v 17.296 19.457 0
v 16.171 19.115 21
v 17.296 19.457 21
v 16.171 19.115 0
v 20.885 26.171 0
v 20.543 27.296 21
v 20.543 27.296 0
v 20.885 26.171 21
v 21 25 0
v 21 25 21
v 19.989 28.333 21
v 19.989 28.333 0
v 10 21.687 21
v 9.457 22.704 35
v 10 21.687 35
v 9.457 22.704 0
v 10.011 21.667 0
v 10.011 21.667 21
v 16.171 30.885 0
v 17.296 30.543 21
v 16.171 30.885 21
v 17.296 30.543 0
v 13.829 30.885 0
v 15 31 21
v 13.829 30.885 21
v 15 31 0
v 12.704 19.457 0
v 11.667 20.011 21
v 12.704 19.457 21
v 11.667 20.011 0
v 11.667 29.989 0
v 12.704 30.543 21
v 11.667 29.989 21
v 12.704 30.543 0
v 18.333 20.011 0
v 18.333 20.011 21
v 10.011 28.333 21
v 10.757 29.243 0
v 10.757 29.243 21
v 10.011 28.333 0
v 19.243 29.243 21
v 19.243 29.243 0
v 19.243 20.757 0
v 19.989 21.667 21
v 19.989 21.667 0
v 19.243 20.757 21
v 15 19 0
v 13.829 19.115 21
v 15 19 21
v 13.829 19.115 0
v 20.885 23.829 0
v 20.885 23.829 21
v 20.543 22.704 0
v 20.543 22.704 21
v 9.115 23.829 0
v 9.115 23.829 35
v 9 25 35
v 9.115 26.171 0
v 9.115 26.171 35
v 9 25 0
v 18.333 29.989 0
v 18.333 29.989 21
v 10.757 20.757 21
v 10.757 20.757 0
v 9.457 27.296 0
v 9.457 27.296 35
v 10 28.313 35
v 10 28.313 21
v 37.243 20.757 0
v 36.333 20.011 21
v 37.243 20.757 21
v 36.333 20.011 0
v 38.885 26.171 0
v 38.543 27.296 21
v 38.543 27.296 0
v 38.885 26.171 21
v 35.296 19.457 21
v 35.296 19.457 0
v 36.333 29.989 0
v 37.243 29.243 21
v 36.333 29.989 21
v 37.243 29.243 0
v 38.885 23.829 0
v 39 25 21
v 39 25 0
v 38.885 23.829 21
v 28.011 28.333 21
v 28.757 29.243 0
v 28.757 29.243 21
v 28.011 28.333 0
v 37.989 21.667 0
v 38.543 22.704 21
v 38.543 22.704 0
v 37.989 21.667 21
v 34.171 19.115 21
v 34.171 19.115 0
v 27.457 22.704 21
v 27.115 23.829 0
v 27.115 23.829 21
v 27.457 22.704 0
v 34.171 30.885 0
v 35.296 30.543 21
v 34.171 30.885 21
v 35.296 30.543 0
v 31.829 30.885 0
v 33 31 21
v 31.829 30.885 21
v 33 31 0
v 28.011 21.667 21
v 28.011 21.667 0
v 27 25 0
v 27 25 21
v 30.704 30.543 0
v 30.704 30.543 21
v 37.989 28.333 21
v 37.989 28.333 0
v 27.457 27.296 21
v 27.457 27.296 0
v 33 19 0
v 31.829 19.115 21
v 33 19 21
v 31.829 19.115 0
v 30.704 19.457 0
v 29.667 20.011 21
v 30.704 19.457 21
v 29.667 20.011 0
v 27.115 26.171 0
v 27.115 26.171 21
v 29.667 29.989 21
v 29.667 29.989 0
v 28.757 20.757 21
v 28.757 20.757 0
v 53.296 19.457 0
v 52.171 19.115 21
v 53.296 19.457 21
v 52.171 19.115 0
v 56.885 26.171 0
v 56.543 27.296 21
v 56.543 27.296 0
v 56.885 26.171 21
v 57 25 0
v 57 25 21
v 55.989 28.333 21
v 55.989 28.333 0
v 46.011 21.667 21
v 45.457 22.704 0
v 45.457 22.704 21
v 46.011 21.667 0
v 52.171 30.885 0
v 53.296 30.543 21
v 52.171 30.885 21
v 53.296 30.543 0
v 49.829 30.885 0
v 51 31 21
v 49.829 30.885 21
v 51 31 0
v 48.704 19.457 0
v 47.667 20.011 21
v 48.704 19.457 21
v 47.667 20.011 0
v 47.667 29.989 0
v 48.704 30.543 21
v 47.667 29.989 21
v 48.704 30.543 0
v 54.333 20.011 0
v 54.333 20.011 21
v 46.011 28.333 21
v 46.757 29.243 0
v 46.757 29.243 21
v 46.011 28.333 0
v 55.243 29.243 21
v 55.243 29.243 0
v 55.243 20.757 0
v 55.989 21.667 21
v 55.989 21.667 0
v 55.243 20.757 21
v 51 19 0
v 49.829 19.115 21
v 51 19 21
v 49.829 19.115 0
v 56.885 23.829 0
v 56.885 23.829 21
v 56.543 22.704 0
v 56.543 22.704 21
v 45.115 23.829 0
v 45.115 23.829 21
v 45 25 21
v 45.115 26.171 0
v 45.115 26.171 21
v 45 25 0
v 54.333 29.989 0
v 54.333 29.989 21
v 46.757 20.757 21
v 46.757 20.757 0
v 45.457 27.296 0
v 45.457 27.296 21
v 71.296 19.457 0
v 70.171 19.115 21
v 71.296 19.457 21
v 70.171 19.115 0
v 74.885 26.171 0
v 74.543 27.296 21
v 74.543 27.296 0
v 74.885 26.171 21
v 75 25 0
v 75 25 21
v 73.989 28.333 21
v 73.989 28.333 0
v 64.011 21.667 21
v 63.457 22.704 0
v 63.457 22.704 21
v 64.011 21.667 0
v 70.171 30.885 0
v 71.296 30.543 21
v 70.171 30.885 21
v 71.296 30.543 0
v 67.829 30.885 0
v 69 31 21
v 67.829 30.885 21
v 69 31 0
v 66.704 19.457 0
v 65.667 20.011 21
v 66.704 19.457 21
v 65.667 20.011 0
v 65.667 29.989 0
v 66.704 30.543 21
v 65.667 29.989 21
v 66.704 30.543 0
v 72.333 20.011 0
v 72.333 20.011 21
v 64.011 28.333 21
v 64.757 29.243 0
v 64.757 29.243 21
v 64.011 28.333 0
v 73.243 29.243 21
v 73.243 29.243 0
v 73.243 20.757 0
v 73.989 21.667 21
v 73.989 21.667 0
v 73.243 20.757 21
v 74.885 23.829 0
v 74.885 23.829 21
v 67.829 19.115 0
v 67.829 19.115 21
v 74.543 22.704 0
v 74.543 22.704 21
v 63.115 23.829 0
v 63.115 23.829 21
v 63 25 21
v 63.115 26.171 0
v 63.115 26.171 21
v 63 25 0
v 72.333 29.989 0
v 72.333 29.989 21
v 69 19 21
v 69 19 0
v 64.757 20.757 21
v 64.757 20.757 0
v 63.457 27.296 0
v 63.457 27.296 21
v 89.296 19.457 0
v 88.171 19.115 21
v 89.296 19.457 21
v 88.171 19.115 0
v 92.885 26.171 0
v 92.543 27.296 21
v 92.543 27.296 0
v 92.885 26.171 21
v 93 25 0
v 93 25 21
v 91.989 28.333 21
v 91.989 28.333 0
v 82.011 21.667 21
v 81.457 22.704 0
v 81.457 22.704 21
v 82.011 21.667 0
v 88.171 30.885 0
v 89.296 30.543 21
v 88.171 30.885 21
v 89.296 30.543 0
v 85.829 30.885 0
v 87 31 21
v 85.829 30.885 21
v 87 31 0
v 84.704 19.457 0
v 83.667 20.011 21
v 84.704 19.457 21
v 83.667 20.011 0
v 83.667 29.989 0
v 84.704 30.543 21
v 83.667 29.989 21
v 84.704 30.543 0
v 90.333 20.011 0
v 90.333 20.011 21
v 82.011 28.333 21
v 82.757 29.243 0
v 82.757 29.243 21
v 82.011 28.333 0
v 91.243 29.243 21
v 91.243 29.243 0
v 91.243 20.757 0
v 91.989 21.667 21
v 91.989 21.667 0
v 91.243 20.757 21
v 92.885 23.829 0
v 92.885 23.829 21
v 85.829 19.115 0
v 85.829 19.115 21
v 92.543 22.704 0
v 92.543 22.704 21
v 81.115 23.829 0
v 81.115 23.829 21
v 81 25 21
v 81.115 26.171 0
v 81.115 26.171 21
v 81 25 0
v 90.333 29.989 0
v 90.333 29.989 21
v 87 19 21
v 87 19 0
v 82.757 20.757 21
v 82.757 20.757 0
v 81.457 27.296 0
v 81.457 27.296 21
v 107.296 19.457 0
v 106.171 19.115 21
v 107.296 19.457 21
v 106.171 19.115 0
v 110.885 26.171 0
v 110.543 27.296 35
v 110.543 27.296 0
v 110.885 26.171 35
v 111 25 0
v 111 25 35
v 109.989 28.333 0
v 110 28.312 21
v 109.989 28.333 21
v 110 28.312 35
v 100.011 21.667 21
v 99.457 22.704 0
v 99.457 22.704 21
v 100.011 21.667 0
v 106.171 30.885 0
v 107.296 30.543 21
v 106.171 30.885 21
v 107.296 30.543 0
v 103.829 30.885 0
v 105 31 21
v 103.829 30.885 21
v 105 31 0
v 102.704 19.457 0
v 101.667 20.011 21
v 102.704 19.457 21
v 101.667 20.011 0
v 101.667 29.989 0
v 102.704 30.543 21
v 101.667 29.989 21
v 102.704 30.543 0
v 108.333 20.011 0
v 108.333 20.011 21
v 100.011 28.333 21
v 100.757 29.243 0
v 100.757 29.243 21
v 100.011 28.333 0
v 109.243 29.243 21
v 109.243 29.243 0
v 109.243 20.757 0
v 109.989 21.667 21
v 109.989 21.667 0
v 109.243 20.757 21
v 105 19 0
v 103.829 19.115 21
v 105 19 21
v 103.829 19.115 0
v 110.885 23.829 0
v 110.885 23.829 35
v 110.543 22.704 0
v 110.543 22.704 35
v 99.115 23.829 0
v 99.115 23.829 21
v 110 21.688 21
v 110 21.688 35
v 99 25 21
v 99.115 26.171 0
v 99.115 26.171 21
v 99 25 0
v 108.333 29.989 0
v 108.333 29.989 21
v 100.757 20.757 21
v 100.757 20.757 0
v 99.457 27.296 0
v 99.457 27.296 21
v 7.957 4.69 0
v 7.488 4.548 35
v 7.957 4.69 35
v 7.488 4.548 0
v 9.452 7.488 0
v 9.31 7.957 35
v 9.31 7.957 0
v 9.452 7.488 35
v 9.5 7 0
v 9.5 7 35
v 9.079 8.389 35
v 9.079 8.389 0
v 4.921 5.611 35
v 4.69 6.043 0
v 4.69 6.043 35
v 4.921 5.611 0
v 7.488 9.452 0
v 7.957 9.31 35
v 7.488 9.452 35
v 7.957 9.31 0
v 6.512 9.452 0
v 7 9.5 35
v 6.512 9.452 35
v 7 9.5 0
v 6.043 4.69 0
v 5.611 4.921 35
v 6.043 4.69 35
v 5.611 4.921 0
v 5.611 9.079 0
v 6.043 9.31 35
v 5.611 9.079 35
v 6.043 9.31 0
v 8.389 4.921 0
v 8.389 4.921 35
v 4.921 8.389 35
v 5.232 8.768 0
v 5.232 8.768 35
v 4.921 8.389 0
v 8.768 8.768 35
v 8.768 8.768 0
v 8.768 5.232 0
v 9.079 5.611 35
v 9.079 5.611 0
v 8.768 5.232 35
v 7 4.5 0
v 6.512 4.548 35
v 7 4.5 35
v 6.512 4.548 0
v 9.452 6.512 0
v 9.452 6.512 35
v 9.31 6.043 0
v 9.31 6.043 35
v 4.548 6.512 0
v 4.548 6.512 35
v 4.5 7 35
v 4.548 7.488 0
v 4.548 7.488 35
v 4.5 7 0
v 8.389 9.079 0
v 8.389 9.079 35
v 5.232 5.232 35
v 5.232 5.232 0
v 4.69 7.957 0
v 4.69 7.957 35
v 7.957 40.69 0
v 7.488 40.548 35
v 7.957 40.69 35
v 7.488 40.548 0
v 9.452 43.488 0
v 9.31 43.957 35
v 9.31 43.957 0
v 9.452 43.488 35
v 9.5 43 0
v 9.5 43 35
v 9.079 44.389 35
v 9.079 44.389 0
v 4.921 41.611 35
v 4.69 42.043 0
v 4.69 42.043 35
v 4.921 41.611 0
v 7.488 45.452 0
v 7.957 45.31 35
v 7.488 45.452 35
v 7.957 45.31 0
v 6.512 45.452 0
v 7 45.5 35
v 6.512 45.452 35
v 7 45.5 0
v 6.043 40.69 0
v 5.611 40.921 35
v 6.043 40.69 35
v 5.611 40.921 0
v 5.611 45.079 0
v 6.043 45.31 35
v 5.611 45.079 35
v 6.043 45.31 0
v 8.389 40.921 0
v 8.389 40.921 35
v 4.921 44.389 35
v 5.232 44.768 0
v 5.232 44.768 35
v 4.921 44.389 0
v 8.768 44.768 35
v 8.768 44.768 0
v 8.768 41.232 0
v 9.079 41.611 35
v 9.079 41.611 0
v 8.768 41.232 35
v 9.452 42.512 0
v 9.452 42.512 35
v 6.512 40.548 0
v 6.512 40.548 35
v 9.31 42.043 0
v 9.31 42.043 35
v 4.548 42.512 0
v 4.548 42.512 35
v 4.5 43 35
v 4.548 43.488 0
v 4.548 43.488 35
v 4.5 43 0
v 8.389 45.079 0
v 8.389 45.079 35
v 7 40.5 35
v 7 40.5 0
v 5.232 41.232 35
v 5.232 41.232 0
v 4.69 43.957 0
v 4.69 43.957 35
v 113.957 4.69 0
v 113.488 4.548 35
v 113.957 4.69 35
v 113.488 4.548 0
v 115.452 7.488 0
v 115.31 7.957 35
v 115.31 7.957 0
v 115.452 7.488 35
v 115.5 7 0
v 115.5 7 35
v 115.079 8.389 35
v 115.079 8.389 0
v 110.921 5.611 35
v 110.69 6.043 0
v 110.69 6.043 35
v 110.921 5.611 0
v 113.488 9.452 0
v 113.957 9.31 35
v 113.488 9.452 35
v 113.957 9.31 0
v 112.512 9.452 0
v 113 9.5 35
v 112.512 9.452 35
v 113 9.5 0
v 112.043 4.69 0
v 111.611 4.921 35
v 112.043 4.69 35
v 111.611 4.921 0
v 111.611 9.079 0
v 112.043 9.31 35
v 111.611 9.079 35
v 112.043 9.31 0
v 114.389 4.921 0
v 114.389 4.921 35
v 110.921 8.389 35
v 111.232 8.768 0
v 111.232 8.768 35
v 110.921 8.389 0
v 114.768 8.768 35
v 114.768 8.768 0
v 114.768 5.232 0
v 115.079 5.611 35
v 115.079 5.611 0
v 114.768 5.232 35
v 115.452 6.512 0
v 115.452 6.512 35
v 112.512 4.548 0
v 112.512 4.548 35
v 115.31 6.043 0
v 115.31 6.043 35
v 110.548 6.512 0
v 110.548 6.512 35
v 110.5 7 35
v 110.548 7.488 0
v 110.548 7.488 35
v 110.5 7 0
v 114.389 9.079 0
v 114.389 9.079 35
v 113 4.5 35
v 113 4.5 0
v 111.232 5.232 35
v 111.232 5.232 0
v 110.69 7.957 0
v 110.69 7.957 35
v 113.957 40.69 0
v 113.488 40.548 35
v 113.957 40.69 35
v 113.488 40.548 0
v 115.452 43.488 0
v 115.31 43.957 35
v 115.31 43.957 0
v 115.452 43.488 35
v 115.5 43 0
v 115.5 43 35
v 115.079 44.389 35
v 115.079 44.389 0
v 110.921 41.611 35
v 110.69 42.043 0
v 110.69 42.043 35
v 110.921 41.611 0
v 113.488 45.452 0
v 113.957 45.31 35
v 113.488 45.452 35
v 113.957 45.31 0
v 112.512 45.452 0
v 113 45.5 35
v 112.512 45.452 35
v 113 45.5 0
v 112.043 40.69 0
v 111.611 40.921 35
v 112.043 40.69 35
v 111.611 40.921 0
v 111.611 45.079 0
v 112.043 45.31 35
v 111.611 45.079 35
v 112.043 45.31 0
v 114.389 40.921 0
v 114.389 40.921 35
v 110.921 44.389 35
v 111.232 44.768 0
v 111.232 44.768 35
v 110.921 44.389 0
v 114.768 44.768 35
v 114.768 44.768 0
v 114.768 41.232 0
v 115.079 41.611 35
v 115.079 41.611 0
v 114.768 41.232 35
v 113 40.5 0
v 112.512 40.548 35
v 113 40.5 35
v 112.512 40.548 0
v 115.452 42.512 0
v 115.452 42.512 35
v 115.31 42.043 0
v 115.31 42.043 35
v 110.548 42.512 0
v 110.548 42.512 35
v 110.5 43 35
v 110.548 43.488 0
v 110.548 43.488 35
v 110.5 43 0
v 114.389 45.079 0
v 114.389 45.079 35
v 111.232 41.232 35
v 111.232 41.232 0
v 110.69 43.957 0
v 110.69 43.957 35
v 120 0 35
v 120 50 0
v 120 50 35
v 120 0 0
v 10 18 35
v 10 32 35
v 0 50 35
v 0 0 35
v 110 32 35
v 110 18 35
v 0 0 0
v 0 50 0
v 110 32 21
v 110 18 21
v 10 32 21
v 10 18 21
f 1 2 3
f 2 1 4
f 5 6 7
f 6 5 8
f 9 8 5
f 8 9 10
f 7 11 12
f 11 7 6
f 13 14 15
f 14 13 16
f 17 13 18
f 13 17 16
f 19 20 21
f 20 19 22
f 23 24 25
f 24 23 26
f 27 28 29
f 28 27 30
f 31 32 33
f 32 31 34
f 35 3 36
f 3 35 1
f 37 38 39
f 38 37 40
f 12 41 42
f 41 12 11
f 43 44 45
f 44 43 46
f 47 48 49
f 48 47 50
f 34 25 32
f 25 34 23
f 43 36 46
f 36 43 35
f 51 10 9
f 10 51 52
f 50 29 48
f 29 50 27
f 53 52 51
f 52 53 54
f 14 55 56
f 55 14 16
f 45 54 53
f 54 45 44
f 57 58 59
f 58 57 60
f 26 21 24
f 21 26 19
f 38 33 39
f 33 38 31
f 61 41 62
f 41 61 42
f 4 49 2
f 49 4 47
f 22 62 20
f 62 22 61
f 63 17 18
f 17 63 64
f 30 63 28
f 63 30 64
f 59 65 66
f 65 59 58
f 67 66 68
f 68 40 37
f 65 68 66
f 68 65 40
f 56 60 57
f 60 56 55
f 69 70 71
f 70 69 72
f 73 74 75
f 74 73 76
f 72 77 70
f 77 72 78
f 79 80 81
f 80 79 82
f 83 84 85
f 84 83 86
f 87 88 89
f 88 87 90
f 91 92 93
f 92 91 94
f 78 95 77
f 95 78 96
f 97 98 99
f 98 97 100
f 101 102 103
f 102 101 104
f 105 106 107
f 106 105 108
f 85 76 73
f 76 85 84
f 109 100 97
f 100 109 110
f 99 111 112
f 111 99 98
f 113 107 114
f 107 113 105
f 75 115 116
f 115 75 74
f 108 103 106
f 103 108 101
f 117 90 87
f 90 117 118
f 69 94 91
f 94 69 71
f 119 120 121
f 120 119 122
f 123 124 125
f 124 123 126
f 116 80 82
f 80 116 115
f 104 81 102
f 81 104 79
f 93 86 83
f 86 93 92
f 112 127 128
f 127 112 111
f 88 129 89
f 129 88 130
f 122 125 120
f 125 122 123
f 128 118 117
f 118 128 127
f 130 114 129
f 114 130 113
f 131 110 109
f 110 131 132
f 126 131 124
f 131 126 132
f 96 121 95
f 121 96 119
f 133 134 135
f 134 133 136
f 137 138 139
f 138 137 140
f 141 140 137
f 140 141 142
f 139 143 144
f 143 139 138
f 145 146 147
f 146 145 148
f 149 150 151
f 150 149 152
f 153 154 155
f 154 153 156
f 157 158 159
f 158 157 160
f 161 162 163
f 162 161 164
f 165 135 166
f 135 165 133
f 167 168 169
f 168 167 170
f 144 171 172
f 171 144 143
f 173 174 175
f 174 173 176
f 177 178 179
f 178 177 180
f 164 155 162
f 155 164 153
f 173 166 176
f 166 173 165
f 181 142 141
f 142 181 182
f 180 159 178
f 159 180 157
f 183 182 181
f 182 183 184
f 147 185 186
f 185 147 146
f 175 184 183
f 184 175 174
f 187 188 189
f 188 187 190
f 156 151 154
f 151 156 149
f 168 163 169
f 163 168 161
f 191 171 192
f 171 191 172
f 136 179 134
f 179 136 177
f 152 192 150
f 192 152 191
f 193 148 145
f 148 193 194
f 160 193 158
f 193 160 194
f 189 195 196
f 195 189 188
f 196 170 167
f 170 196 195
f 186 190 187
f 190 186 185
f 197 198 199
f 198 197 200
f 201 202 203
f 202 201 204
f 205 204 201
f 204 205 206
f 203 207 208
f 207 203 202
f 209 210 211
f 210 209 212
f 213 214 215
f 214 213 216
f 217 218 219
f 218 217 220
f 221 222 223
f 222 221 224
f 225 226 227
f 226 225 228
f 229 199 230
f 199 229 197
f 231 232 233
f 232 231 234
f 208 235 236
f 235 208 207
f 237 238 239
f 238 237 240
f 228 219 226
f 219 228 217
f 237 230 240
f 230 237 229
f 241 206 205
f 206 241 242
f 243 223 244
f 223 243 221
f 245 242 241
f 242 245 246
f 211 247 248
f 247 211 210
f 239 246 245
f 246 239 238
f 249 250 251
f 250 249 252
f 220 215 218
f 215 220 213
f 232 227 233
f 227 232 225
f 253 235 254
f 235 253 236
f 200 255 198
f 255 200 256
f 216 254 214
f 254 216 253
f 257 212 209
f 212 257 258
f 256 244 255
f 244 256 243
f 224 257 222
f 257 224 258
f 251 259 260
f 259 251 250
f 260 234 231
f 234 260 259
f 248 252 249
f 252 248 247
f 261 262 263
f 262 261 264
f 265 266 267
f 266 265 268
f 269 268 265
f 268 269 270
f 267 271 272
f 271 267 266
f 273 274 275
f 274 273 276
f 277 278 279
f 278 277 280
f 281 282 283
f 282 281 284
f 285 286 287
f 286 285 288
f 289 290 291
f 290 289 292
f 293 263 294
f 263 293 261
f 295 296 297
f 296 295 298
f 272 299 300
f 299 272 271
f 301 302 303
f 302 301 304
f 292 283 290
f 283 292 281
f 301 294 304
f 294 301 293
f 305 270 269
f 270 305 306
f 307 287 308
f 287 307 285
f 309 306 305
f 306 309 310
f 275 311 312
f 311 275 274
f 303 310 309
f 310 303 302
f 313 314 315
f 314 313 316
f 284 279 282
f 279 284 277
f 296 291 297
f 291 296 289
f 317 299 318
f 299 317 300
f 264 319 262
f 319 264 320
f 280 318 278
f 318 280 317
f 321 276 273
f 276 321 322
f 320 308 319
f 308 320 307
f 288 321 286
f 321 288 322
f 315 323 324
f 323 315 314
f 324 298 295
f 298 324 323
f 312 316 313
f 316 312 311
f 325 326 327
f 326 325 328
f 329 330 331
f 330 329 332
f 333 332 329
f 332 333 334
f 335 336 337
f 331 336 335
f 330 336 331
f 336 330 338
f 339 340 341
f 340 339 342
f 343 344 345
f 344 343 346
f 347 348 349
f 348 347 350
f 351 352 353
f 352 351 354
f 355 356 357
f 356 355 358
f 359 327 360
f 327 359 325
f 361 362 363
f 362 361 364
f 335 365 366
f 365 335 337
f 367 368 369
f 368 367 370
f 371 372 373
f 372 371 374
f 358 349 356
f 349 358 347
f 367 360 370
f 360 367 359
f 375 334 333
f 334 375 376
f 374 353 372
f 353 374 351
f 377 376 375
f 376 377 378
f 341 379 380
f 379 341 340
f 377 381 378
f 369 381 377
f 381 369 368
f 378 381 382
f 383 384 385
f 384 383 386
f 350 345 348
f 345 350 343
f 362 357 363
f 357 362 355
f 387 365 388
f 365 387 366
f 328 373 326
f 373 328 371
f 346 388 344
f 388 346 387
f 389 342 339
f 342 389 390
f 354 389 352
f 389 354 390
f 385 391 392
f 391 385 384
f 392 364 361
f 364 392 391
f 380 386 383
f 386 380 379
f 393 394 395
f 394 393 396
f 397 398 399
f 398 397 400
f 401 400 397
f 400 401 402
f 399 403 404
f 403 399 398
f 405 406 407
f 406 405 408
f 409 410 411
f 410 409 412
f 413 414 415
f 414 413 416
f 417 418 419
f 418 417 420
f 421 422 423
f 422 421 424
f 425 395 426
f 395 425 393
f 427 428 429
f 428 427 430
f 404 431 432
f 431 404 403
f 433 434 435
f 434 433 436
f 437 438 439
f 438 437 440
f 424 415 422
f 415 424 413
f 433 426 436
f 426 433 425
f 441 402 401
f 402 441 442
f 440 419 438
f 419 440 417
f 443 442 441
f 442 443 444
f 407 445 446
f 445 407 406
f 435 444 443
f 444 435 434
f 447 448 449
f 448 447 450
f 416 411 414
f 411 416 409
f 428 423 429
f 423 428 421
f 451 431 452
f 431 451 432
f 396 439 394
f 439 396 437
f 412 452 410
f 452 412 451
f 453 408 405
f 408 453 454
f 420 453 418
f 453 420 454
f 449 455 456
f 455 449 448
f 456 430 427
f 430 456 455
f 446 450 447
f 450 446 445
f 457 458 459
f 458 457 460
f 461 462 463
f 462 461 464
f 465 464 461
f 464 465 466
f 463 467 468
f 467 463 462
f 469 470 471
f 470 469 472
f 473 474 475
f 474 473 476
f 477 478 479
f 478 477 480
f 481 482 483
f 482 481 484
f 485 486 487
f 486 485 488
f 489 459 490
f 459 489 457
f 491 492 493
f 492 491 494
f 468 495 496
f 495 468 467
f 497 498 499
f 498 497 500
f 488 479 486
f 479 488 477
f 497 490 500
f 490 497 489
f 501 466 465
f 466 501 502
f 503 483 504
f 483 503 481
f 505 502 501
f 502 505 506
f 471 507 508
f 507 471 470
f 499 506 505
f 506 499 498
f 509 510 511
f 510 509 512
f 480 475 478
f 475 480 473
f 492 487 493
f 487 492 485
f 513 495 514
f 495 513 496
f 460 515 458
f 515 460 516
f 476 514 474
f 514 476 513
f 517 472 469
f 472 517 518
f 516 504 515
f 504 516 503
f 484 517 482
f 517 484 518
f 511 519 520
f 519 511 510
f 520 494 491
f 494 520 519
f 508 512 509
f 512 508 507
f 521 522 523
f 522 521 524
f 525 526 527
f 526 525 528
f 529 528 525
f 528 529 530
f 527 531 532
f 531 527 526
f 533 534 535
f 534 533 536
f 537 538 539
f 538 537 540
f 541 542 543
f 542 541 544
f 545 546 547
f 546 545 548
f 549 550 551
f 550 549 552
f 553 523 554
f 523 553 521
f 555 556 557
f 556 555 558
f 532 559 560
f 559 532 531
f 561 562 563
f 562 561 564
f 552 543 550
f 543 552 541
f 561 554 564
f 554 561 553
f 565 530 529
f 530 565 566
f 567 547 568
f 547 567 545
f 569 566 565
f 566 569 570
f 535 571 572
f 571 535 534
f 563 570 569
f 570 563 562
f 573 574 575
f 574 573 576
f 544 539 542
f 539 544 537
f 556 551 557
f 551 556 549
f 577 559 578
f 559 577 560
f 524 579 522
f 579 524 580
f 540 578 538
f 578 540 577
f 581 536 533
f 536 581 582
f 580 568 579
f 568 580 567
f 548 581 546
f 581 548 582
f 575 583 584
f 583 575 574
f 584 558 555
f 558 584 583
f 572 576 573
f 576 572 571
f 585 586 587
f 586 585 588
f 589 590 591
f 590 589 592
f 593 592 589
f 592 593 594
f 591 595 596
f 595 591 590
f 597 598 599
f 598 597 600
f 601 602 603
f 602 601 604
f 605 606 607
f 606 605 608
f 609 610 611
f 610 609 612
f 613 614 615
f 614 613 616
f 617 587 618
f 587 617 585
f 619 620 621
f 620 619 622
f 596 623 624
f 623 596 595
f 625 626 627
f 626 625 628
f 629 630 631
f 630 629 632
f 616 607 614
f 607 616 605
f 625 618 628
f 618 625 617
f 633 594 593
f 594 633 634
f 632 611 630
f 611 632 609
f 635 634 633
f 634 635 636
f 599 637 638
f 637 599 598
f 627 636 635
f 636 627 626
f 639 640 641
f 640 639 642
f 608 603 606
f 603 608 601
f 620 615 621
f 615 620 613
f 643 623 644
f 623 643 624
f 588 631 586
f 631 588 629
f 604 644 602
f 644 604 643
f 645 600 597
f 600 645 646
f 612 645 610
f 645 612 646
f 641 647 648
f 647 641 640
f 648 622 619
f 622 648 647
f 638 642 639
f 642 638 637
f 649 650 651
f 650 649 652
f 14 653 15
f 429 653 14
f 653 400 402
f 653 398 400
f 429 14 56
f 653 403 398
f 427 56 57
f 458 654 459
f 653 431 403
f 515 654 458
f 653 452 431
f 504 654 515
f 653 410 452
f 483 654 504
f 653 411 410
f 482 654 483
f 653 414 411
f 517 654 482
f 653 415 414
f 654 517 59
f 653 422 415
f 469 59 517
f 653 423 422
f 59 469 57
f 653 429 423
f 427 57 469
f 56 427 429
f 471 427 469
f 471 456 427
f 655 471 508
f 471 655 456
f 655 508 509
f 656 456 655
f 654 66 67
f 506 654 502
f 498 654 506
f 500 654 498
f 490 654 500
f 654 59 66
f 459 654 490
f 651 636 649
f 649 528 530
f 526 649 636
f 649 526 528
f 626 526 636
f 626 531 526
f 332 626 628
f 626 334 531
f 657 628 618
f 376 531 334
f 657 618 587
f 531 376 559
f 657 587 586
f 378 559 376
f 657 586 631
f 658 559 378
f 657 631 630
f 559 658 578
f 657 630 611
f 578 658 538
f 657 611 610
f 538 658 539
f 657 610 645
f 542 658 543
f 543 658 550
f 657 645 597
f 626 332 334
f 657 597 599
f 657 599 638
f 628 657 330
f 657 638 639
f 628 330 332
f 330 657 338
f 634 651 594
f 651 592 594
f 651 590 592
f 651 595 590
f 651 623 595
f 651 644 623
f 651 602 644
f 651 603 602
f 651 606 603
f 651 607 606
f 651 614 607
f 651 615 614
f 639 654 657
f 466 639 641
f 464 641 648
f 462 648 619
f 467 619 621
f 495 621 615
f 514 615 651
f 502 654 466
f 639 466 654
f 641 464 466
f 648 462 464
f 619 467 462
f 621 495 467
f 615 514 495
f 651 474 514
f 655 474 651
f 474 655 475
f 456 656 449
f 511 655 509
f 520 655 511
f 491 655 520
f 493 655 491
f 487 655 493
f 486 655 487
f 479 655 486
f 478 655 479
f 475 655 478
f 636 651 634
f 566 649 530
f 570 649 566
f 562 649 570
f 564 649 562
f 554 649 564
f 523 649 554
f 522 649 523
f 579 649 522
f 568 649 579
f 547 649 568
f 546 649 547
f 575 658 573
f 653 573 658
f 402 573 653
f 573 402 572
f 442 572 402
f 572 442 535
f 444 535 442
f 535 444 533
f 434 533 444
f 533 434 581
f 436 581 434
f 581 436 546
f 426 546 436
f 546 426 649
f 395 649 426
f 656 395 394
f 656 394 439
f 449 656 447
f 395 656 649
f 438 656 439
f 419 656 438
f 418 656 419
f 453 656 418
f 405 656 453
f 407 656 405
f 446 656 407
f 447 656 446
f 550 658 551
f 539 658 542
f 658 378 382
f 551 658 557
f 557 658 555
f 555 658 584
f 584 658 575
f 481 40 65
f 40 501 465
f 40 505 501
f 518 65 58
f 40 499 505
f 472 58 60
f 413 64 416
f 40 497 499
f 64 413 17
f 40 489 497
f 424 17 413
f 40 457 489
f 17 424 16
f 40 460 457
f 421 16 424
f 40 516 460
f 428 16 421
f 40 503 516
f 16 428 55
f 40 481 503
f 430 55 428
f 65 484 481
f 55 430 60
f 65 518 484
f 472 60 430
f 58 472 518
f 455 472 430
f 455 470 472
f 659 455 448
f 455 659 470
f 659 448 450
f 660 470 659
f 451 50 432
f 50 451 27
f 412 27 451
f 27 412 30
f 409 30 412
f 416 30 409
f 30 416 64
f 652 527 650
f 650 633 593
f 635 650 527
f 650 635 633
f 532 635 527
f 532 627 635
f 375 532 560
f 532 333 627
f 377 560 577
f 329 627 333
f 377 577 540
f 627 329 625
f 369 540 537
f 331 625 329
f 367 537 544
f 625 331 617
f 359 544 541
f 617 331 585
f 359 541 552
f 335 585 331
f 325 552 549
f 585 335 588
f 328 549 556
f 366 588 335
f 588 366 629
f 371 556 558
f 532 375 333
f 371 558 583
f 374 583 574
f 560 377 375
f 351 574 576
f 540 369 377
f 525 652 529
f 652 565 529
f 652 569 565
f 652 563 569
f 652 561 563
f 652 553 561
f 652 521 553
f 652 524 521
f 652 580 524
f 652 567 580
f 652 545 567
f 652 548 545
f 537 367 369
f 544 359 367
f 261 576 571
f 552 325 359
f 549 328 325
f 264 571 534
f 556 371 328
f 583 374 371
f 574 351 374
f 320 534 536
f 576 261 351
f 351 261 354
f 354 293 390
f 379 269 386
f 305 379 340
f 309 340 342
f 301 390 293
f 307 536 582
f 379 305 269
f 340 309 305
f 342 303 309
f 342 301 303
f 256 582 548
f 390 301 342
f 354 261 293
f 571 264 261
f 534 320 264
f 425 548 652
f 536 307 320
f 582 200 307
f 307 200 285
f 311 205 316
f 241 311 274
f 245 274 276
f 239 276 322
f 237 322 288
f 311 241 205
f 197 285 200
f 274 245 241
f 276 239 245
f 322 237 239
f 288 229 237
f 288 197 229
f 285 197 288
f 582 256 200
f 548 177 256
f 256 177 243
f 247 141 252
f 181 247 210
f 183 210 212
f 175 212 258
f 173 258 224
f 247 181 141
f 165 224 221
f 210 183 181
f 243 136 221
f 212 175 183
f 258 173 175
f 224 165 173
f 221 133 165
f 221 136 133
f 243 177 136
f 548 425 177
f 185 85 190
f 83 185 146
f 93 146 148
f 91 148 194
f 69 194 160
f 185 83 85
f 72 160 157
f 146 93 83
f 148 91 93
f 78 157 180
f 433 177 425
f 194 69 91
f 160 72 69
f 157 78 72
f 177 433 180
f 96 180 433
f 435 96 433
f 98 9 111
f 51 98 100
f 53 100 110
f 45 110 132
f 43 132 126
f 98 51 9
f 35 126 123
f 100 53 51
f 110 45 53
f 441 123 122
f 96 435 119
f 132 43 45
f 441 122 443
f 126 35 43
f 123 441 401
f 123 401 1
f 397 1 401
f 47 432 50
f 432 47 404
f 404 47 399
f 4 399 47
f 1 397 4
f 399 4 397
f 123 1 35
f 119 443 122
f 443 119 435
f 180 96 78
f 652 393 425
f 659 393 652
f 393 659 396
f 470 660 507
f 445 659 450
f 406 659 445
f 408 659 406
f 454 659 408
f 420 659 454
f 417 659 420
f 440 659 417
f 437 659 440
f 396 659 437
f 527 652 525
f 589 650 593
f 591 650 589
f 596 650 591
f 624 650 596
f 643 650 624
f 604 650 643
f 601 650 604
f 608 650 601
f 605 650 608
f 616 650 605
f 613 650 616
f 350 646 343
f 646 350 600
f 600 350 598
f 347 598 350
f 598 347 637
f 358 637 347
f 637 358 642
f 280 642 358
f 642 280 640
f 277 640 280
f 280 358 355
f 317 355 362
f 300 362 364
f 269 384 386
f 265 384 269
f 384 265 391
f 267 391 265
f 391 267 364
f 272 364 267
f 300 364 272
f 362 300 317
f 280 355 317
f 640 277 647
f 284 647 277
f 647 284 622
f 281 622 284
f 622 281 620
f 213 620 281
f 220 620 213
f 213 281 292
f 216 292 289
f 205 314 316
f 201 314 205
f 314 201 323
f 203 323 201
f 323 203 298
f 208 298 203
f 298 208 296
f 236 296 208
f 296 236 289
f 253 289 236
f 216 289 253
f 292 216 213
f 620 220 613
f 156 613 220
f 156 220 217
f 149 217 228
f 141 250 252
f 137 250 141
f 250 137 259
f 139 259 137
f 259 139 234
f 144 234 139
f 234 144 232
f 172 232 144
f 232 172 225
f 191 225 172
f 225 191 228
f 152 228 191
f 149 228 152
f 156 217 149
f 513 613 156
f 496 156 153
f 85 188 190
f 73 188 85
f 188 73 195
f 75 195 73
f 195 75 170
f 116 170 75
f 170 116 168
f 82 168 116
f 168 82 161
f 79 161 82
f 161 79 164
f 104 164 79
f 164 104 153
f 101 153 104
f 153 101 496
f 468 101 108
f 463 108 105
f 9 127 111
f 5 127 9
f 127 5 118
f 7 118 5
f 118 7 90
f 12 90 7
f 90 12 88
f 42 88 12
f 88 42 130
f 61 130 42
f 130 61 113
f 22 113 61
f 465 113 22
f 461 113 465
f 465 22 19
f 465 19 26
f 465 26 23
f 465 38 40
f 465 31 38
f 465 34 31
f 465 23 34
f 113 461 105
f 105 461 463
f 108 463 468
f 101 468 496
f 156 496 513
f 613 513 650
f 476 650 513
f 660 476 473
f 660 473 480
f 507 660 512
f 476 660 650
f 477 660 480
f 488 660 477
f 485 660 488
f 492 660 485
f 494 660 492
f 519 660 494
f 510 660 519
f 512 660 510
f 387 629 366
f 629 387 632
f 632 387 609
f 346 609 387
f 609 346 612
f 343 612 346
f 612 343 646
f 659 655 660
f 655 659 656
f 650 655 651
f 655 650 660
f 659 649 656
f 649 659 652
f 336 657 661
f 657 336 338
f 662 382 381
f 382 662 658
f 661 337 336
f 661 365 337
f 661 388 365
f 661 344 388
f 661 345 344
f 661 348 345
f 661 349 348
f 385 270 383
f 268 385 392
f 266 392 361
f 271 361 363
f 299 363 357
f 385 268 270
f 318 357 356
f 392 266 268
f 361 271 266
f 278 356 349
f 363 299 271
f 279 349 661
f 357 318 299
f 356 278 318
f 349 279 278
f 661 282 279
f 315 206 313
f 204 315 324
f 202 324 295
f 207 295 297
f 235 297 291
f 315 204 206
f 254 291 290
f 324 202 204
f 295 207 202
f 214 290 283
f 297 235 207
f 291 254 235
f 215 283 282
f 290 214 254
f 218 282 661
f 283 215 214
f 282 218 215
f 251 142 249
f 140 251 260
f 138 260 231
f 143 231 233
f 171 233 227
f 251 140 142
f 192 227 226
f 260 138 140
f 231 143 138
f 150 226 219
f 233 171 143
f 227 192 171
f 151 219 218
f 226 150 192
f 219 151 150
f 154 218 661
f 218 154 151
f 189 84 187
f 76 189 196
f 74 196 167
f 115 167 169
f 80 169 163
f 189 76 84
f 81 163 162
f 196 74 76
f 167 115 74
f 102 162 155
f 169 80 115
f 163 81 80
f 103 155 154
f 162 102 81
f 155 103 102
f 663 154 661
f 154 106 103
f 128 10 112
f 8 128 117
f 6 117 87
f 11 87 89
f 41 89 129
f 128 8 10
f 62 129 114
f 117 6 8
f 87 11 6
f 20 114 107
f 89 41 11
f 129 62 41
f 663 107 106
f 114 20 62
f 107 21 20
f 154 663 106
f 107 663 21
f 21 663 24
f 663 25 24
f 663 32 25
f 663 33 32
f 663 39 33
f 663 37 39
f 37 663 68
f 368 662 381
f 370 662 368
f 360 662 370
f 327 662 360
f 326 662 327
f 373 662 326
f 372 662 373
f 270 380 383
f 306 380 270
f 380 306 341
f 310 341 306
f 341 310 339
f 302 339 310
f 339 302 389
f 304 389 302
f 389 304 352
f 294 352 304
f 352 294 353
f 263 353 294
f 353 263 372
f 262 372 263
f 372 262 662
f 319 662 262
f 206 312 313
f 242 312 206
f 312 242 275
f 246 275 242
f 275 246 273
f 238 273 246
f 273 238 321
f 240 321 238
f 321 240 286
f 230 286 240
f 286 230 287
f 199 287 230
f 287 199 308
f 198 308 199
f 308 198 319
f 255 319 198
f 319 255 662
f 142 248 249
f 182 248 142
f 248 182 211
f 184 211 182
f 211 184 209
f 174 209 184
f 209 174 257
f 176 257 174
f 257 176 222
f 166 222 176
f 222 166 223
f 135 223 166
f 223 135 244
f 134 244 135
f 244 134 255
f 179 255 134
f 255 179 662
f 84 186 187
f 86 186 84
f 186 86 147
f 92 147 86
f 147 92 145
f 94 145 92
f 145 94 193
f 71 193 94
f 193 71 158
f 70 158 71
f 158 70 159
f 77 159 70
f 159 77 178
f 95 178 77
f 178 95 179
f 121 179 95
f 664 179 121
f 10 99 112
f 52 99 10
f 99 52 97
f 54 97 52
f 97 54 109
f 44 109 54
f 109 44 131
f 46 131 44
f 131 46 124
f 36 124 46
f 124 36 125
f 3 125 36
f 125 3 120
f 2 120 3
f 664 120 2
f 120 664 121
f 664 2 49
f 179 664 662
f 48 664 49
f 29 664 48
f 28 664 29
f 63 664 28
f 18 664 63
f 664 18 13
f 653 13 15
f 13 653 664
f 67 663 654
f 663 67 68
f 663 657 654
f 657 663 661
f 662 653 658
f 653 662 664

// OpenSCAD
$fn = 32;

// ----------------------------------------------------------------------
// Manifold block: gallery_top manifold
// ----------------------------------------------------------------------

// --- parameters (mm) ---
block_l = 120;            // block length, X
block_w = 50;             // block width, Y
block_h = 35;             // block height, Z
port_d = 12;              // port bore diameter
port_pitch = 18;          // port pitch along X
gallery_d = 14;           // top gallery width, Y
gallery_depth = 14;       // gallery pocket depth
wall_p = 10;              // gallery end wall thickness, X
mnt_d = 5;                // mounting hole diameter
mnt_in = 7;               // mounting hole inset from the edges

n_ports = 6;  // ports in the row
port_x0 = (block_l - (n_ports - 1) * port_pitch) / 2;  // first port X

difference() {
  cube([block_l, block_w, block_h]);
  for (i = [0 : n_ports - 1])
    translate([port_x0 + i * port_pitch, block_w / 2, -1])
      cylinder(h = block_h + 2, d = port_d);
  translate([wall_p, block_w / 2 - gallery_d / 2, block_h - gallery_depth])
    cube([block_l - 2 * wall_p, gallery_d, gallery_depth + 1]);
  for (cx = [mnt_in, block_l - mnt_in])
    for (cy = [mnt_in, block_w - mnt_in])
      translate([cx, cy, -1]) cylinder(h = block_h + 2, d = mnt_d);
}
